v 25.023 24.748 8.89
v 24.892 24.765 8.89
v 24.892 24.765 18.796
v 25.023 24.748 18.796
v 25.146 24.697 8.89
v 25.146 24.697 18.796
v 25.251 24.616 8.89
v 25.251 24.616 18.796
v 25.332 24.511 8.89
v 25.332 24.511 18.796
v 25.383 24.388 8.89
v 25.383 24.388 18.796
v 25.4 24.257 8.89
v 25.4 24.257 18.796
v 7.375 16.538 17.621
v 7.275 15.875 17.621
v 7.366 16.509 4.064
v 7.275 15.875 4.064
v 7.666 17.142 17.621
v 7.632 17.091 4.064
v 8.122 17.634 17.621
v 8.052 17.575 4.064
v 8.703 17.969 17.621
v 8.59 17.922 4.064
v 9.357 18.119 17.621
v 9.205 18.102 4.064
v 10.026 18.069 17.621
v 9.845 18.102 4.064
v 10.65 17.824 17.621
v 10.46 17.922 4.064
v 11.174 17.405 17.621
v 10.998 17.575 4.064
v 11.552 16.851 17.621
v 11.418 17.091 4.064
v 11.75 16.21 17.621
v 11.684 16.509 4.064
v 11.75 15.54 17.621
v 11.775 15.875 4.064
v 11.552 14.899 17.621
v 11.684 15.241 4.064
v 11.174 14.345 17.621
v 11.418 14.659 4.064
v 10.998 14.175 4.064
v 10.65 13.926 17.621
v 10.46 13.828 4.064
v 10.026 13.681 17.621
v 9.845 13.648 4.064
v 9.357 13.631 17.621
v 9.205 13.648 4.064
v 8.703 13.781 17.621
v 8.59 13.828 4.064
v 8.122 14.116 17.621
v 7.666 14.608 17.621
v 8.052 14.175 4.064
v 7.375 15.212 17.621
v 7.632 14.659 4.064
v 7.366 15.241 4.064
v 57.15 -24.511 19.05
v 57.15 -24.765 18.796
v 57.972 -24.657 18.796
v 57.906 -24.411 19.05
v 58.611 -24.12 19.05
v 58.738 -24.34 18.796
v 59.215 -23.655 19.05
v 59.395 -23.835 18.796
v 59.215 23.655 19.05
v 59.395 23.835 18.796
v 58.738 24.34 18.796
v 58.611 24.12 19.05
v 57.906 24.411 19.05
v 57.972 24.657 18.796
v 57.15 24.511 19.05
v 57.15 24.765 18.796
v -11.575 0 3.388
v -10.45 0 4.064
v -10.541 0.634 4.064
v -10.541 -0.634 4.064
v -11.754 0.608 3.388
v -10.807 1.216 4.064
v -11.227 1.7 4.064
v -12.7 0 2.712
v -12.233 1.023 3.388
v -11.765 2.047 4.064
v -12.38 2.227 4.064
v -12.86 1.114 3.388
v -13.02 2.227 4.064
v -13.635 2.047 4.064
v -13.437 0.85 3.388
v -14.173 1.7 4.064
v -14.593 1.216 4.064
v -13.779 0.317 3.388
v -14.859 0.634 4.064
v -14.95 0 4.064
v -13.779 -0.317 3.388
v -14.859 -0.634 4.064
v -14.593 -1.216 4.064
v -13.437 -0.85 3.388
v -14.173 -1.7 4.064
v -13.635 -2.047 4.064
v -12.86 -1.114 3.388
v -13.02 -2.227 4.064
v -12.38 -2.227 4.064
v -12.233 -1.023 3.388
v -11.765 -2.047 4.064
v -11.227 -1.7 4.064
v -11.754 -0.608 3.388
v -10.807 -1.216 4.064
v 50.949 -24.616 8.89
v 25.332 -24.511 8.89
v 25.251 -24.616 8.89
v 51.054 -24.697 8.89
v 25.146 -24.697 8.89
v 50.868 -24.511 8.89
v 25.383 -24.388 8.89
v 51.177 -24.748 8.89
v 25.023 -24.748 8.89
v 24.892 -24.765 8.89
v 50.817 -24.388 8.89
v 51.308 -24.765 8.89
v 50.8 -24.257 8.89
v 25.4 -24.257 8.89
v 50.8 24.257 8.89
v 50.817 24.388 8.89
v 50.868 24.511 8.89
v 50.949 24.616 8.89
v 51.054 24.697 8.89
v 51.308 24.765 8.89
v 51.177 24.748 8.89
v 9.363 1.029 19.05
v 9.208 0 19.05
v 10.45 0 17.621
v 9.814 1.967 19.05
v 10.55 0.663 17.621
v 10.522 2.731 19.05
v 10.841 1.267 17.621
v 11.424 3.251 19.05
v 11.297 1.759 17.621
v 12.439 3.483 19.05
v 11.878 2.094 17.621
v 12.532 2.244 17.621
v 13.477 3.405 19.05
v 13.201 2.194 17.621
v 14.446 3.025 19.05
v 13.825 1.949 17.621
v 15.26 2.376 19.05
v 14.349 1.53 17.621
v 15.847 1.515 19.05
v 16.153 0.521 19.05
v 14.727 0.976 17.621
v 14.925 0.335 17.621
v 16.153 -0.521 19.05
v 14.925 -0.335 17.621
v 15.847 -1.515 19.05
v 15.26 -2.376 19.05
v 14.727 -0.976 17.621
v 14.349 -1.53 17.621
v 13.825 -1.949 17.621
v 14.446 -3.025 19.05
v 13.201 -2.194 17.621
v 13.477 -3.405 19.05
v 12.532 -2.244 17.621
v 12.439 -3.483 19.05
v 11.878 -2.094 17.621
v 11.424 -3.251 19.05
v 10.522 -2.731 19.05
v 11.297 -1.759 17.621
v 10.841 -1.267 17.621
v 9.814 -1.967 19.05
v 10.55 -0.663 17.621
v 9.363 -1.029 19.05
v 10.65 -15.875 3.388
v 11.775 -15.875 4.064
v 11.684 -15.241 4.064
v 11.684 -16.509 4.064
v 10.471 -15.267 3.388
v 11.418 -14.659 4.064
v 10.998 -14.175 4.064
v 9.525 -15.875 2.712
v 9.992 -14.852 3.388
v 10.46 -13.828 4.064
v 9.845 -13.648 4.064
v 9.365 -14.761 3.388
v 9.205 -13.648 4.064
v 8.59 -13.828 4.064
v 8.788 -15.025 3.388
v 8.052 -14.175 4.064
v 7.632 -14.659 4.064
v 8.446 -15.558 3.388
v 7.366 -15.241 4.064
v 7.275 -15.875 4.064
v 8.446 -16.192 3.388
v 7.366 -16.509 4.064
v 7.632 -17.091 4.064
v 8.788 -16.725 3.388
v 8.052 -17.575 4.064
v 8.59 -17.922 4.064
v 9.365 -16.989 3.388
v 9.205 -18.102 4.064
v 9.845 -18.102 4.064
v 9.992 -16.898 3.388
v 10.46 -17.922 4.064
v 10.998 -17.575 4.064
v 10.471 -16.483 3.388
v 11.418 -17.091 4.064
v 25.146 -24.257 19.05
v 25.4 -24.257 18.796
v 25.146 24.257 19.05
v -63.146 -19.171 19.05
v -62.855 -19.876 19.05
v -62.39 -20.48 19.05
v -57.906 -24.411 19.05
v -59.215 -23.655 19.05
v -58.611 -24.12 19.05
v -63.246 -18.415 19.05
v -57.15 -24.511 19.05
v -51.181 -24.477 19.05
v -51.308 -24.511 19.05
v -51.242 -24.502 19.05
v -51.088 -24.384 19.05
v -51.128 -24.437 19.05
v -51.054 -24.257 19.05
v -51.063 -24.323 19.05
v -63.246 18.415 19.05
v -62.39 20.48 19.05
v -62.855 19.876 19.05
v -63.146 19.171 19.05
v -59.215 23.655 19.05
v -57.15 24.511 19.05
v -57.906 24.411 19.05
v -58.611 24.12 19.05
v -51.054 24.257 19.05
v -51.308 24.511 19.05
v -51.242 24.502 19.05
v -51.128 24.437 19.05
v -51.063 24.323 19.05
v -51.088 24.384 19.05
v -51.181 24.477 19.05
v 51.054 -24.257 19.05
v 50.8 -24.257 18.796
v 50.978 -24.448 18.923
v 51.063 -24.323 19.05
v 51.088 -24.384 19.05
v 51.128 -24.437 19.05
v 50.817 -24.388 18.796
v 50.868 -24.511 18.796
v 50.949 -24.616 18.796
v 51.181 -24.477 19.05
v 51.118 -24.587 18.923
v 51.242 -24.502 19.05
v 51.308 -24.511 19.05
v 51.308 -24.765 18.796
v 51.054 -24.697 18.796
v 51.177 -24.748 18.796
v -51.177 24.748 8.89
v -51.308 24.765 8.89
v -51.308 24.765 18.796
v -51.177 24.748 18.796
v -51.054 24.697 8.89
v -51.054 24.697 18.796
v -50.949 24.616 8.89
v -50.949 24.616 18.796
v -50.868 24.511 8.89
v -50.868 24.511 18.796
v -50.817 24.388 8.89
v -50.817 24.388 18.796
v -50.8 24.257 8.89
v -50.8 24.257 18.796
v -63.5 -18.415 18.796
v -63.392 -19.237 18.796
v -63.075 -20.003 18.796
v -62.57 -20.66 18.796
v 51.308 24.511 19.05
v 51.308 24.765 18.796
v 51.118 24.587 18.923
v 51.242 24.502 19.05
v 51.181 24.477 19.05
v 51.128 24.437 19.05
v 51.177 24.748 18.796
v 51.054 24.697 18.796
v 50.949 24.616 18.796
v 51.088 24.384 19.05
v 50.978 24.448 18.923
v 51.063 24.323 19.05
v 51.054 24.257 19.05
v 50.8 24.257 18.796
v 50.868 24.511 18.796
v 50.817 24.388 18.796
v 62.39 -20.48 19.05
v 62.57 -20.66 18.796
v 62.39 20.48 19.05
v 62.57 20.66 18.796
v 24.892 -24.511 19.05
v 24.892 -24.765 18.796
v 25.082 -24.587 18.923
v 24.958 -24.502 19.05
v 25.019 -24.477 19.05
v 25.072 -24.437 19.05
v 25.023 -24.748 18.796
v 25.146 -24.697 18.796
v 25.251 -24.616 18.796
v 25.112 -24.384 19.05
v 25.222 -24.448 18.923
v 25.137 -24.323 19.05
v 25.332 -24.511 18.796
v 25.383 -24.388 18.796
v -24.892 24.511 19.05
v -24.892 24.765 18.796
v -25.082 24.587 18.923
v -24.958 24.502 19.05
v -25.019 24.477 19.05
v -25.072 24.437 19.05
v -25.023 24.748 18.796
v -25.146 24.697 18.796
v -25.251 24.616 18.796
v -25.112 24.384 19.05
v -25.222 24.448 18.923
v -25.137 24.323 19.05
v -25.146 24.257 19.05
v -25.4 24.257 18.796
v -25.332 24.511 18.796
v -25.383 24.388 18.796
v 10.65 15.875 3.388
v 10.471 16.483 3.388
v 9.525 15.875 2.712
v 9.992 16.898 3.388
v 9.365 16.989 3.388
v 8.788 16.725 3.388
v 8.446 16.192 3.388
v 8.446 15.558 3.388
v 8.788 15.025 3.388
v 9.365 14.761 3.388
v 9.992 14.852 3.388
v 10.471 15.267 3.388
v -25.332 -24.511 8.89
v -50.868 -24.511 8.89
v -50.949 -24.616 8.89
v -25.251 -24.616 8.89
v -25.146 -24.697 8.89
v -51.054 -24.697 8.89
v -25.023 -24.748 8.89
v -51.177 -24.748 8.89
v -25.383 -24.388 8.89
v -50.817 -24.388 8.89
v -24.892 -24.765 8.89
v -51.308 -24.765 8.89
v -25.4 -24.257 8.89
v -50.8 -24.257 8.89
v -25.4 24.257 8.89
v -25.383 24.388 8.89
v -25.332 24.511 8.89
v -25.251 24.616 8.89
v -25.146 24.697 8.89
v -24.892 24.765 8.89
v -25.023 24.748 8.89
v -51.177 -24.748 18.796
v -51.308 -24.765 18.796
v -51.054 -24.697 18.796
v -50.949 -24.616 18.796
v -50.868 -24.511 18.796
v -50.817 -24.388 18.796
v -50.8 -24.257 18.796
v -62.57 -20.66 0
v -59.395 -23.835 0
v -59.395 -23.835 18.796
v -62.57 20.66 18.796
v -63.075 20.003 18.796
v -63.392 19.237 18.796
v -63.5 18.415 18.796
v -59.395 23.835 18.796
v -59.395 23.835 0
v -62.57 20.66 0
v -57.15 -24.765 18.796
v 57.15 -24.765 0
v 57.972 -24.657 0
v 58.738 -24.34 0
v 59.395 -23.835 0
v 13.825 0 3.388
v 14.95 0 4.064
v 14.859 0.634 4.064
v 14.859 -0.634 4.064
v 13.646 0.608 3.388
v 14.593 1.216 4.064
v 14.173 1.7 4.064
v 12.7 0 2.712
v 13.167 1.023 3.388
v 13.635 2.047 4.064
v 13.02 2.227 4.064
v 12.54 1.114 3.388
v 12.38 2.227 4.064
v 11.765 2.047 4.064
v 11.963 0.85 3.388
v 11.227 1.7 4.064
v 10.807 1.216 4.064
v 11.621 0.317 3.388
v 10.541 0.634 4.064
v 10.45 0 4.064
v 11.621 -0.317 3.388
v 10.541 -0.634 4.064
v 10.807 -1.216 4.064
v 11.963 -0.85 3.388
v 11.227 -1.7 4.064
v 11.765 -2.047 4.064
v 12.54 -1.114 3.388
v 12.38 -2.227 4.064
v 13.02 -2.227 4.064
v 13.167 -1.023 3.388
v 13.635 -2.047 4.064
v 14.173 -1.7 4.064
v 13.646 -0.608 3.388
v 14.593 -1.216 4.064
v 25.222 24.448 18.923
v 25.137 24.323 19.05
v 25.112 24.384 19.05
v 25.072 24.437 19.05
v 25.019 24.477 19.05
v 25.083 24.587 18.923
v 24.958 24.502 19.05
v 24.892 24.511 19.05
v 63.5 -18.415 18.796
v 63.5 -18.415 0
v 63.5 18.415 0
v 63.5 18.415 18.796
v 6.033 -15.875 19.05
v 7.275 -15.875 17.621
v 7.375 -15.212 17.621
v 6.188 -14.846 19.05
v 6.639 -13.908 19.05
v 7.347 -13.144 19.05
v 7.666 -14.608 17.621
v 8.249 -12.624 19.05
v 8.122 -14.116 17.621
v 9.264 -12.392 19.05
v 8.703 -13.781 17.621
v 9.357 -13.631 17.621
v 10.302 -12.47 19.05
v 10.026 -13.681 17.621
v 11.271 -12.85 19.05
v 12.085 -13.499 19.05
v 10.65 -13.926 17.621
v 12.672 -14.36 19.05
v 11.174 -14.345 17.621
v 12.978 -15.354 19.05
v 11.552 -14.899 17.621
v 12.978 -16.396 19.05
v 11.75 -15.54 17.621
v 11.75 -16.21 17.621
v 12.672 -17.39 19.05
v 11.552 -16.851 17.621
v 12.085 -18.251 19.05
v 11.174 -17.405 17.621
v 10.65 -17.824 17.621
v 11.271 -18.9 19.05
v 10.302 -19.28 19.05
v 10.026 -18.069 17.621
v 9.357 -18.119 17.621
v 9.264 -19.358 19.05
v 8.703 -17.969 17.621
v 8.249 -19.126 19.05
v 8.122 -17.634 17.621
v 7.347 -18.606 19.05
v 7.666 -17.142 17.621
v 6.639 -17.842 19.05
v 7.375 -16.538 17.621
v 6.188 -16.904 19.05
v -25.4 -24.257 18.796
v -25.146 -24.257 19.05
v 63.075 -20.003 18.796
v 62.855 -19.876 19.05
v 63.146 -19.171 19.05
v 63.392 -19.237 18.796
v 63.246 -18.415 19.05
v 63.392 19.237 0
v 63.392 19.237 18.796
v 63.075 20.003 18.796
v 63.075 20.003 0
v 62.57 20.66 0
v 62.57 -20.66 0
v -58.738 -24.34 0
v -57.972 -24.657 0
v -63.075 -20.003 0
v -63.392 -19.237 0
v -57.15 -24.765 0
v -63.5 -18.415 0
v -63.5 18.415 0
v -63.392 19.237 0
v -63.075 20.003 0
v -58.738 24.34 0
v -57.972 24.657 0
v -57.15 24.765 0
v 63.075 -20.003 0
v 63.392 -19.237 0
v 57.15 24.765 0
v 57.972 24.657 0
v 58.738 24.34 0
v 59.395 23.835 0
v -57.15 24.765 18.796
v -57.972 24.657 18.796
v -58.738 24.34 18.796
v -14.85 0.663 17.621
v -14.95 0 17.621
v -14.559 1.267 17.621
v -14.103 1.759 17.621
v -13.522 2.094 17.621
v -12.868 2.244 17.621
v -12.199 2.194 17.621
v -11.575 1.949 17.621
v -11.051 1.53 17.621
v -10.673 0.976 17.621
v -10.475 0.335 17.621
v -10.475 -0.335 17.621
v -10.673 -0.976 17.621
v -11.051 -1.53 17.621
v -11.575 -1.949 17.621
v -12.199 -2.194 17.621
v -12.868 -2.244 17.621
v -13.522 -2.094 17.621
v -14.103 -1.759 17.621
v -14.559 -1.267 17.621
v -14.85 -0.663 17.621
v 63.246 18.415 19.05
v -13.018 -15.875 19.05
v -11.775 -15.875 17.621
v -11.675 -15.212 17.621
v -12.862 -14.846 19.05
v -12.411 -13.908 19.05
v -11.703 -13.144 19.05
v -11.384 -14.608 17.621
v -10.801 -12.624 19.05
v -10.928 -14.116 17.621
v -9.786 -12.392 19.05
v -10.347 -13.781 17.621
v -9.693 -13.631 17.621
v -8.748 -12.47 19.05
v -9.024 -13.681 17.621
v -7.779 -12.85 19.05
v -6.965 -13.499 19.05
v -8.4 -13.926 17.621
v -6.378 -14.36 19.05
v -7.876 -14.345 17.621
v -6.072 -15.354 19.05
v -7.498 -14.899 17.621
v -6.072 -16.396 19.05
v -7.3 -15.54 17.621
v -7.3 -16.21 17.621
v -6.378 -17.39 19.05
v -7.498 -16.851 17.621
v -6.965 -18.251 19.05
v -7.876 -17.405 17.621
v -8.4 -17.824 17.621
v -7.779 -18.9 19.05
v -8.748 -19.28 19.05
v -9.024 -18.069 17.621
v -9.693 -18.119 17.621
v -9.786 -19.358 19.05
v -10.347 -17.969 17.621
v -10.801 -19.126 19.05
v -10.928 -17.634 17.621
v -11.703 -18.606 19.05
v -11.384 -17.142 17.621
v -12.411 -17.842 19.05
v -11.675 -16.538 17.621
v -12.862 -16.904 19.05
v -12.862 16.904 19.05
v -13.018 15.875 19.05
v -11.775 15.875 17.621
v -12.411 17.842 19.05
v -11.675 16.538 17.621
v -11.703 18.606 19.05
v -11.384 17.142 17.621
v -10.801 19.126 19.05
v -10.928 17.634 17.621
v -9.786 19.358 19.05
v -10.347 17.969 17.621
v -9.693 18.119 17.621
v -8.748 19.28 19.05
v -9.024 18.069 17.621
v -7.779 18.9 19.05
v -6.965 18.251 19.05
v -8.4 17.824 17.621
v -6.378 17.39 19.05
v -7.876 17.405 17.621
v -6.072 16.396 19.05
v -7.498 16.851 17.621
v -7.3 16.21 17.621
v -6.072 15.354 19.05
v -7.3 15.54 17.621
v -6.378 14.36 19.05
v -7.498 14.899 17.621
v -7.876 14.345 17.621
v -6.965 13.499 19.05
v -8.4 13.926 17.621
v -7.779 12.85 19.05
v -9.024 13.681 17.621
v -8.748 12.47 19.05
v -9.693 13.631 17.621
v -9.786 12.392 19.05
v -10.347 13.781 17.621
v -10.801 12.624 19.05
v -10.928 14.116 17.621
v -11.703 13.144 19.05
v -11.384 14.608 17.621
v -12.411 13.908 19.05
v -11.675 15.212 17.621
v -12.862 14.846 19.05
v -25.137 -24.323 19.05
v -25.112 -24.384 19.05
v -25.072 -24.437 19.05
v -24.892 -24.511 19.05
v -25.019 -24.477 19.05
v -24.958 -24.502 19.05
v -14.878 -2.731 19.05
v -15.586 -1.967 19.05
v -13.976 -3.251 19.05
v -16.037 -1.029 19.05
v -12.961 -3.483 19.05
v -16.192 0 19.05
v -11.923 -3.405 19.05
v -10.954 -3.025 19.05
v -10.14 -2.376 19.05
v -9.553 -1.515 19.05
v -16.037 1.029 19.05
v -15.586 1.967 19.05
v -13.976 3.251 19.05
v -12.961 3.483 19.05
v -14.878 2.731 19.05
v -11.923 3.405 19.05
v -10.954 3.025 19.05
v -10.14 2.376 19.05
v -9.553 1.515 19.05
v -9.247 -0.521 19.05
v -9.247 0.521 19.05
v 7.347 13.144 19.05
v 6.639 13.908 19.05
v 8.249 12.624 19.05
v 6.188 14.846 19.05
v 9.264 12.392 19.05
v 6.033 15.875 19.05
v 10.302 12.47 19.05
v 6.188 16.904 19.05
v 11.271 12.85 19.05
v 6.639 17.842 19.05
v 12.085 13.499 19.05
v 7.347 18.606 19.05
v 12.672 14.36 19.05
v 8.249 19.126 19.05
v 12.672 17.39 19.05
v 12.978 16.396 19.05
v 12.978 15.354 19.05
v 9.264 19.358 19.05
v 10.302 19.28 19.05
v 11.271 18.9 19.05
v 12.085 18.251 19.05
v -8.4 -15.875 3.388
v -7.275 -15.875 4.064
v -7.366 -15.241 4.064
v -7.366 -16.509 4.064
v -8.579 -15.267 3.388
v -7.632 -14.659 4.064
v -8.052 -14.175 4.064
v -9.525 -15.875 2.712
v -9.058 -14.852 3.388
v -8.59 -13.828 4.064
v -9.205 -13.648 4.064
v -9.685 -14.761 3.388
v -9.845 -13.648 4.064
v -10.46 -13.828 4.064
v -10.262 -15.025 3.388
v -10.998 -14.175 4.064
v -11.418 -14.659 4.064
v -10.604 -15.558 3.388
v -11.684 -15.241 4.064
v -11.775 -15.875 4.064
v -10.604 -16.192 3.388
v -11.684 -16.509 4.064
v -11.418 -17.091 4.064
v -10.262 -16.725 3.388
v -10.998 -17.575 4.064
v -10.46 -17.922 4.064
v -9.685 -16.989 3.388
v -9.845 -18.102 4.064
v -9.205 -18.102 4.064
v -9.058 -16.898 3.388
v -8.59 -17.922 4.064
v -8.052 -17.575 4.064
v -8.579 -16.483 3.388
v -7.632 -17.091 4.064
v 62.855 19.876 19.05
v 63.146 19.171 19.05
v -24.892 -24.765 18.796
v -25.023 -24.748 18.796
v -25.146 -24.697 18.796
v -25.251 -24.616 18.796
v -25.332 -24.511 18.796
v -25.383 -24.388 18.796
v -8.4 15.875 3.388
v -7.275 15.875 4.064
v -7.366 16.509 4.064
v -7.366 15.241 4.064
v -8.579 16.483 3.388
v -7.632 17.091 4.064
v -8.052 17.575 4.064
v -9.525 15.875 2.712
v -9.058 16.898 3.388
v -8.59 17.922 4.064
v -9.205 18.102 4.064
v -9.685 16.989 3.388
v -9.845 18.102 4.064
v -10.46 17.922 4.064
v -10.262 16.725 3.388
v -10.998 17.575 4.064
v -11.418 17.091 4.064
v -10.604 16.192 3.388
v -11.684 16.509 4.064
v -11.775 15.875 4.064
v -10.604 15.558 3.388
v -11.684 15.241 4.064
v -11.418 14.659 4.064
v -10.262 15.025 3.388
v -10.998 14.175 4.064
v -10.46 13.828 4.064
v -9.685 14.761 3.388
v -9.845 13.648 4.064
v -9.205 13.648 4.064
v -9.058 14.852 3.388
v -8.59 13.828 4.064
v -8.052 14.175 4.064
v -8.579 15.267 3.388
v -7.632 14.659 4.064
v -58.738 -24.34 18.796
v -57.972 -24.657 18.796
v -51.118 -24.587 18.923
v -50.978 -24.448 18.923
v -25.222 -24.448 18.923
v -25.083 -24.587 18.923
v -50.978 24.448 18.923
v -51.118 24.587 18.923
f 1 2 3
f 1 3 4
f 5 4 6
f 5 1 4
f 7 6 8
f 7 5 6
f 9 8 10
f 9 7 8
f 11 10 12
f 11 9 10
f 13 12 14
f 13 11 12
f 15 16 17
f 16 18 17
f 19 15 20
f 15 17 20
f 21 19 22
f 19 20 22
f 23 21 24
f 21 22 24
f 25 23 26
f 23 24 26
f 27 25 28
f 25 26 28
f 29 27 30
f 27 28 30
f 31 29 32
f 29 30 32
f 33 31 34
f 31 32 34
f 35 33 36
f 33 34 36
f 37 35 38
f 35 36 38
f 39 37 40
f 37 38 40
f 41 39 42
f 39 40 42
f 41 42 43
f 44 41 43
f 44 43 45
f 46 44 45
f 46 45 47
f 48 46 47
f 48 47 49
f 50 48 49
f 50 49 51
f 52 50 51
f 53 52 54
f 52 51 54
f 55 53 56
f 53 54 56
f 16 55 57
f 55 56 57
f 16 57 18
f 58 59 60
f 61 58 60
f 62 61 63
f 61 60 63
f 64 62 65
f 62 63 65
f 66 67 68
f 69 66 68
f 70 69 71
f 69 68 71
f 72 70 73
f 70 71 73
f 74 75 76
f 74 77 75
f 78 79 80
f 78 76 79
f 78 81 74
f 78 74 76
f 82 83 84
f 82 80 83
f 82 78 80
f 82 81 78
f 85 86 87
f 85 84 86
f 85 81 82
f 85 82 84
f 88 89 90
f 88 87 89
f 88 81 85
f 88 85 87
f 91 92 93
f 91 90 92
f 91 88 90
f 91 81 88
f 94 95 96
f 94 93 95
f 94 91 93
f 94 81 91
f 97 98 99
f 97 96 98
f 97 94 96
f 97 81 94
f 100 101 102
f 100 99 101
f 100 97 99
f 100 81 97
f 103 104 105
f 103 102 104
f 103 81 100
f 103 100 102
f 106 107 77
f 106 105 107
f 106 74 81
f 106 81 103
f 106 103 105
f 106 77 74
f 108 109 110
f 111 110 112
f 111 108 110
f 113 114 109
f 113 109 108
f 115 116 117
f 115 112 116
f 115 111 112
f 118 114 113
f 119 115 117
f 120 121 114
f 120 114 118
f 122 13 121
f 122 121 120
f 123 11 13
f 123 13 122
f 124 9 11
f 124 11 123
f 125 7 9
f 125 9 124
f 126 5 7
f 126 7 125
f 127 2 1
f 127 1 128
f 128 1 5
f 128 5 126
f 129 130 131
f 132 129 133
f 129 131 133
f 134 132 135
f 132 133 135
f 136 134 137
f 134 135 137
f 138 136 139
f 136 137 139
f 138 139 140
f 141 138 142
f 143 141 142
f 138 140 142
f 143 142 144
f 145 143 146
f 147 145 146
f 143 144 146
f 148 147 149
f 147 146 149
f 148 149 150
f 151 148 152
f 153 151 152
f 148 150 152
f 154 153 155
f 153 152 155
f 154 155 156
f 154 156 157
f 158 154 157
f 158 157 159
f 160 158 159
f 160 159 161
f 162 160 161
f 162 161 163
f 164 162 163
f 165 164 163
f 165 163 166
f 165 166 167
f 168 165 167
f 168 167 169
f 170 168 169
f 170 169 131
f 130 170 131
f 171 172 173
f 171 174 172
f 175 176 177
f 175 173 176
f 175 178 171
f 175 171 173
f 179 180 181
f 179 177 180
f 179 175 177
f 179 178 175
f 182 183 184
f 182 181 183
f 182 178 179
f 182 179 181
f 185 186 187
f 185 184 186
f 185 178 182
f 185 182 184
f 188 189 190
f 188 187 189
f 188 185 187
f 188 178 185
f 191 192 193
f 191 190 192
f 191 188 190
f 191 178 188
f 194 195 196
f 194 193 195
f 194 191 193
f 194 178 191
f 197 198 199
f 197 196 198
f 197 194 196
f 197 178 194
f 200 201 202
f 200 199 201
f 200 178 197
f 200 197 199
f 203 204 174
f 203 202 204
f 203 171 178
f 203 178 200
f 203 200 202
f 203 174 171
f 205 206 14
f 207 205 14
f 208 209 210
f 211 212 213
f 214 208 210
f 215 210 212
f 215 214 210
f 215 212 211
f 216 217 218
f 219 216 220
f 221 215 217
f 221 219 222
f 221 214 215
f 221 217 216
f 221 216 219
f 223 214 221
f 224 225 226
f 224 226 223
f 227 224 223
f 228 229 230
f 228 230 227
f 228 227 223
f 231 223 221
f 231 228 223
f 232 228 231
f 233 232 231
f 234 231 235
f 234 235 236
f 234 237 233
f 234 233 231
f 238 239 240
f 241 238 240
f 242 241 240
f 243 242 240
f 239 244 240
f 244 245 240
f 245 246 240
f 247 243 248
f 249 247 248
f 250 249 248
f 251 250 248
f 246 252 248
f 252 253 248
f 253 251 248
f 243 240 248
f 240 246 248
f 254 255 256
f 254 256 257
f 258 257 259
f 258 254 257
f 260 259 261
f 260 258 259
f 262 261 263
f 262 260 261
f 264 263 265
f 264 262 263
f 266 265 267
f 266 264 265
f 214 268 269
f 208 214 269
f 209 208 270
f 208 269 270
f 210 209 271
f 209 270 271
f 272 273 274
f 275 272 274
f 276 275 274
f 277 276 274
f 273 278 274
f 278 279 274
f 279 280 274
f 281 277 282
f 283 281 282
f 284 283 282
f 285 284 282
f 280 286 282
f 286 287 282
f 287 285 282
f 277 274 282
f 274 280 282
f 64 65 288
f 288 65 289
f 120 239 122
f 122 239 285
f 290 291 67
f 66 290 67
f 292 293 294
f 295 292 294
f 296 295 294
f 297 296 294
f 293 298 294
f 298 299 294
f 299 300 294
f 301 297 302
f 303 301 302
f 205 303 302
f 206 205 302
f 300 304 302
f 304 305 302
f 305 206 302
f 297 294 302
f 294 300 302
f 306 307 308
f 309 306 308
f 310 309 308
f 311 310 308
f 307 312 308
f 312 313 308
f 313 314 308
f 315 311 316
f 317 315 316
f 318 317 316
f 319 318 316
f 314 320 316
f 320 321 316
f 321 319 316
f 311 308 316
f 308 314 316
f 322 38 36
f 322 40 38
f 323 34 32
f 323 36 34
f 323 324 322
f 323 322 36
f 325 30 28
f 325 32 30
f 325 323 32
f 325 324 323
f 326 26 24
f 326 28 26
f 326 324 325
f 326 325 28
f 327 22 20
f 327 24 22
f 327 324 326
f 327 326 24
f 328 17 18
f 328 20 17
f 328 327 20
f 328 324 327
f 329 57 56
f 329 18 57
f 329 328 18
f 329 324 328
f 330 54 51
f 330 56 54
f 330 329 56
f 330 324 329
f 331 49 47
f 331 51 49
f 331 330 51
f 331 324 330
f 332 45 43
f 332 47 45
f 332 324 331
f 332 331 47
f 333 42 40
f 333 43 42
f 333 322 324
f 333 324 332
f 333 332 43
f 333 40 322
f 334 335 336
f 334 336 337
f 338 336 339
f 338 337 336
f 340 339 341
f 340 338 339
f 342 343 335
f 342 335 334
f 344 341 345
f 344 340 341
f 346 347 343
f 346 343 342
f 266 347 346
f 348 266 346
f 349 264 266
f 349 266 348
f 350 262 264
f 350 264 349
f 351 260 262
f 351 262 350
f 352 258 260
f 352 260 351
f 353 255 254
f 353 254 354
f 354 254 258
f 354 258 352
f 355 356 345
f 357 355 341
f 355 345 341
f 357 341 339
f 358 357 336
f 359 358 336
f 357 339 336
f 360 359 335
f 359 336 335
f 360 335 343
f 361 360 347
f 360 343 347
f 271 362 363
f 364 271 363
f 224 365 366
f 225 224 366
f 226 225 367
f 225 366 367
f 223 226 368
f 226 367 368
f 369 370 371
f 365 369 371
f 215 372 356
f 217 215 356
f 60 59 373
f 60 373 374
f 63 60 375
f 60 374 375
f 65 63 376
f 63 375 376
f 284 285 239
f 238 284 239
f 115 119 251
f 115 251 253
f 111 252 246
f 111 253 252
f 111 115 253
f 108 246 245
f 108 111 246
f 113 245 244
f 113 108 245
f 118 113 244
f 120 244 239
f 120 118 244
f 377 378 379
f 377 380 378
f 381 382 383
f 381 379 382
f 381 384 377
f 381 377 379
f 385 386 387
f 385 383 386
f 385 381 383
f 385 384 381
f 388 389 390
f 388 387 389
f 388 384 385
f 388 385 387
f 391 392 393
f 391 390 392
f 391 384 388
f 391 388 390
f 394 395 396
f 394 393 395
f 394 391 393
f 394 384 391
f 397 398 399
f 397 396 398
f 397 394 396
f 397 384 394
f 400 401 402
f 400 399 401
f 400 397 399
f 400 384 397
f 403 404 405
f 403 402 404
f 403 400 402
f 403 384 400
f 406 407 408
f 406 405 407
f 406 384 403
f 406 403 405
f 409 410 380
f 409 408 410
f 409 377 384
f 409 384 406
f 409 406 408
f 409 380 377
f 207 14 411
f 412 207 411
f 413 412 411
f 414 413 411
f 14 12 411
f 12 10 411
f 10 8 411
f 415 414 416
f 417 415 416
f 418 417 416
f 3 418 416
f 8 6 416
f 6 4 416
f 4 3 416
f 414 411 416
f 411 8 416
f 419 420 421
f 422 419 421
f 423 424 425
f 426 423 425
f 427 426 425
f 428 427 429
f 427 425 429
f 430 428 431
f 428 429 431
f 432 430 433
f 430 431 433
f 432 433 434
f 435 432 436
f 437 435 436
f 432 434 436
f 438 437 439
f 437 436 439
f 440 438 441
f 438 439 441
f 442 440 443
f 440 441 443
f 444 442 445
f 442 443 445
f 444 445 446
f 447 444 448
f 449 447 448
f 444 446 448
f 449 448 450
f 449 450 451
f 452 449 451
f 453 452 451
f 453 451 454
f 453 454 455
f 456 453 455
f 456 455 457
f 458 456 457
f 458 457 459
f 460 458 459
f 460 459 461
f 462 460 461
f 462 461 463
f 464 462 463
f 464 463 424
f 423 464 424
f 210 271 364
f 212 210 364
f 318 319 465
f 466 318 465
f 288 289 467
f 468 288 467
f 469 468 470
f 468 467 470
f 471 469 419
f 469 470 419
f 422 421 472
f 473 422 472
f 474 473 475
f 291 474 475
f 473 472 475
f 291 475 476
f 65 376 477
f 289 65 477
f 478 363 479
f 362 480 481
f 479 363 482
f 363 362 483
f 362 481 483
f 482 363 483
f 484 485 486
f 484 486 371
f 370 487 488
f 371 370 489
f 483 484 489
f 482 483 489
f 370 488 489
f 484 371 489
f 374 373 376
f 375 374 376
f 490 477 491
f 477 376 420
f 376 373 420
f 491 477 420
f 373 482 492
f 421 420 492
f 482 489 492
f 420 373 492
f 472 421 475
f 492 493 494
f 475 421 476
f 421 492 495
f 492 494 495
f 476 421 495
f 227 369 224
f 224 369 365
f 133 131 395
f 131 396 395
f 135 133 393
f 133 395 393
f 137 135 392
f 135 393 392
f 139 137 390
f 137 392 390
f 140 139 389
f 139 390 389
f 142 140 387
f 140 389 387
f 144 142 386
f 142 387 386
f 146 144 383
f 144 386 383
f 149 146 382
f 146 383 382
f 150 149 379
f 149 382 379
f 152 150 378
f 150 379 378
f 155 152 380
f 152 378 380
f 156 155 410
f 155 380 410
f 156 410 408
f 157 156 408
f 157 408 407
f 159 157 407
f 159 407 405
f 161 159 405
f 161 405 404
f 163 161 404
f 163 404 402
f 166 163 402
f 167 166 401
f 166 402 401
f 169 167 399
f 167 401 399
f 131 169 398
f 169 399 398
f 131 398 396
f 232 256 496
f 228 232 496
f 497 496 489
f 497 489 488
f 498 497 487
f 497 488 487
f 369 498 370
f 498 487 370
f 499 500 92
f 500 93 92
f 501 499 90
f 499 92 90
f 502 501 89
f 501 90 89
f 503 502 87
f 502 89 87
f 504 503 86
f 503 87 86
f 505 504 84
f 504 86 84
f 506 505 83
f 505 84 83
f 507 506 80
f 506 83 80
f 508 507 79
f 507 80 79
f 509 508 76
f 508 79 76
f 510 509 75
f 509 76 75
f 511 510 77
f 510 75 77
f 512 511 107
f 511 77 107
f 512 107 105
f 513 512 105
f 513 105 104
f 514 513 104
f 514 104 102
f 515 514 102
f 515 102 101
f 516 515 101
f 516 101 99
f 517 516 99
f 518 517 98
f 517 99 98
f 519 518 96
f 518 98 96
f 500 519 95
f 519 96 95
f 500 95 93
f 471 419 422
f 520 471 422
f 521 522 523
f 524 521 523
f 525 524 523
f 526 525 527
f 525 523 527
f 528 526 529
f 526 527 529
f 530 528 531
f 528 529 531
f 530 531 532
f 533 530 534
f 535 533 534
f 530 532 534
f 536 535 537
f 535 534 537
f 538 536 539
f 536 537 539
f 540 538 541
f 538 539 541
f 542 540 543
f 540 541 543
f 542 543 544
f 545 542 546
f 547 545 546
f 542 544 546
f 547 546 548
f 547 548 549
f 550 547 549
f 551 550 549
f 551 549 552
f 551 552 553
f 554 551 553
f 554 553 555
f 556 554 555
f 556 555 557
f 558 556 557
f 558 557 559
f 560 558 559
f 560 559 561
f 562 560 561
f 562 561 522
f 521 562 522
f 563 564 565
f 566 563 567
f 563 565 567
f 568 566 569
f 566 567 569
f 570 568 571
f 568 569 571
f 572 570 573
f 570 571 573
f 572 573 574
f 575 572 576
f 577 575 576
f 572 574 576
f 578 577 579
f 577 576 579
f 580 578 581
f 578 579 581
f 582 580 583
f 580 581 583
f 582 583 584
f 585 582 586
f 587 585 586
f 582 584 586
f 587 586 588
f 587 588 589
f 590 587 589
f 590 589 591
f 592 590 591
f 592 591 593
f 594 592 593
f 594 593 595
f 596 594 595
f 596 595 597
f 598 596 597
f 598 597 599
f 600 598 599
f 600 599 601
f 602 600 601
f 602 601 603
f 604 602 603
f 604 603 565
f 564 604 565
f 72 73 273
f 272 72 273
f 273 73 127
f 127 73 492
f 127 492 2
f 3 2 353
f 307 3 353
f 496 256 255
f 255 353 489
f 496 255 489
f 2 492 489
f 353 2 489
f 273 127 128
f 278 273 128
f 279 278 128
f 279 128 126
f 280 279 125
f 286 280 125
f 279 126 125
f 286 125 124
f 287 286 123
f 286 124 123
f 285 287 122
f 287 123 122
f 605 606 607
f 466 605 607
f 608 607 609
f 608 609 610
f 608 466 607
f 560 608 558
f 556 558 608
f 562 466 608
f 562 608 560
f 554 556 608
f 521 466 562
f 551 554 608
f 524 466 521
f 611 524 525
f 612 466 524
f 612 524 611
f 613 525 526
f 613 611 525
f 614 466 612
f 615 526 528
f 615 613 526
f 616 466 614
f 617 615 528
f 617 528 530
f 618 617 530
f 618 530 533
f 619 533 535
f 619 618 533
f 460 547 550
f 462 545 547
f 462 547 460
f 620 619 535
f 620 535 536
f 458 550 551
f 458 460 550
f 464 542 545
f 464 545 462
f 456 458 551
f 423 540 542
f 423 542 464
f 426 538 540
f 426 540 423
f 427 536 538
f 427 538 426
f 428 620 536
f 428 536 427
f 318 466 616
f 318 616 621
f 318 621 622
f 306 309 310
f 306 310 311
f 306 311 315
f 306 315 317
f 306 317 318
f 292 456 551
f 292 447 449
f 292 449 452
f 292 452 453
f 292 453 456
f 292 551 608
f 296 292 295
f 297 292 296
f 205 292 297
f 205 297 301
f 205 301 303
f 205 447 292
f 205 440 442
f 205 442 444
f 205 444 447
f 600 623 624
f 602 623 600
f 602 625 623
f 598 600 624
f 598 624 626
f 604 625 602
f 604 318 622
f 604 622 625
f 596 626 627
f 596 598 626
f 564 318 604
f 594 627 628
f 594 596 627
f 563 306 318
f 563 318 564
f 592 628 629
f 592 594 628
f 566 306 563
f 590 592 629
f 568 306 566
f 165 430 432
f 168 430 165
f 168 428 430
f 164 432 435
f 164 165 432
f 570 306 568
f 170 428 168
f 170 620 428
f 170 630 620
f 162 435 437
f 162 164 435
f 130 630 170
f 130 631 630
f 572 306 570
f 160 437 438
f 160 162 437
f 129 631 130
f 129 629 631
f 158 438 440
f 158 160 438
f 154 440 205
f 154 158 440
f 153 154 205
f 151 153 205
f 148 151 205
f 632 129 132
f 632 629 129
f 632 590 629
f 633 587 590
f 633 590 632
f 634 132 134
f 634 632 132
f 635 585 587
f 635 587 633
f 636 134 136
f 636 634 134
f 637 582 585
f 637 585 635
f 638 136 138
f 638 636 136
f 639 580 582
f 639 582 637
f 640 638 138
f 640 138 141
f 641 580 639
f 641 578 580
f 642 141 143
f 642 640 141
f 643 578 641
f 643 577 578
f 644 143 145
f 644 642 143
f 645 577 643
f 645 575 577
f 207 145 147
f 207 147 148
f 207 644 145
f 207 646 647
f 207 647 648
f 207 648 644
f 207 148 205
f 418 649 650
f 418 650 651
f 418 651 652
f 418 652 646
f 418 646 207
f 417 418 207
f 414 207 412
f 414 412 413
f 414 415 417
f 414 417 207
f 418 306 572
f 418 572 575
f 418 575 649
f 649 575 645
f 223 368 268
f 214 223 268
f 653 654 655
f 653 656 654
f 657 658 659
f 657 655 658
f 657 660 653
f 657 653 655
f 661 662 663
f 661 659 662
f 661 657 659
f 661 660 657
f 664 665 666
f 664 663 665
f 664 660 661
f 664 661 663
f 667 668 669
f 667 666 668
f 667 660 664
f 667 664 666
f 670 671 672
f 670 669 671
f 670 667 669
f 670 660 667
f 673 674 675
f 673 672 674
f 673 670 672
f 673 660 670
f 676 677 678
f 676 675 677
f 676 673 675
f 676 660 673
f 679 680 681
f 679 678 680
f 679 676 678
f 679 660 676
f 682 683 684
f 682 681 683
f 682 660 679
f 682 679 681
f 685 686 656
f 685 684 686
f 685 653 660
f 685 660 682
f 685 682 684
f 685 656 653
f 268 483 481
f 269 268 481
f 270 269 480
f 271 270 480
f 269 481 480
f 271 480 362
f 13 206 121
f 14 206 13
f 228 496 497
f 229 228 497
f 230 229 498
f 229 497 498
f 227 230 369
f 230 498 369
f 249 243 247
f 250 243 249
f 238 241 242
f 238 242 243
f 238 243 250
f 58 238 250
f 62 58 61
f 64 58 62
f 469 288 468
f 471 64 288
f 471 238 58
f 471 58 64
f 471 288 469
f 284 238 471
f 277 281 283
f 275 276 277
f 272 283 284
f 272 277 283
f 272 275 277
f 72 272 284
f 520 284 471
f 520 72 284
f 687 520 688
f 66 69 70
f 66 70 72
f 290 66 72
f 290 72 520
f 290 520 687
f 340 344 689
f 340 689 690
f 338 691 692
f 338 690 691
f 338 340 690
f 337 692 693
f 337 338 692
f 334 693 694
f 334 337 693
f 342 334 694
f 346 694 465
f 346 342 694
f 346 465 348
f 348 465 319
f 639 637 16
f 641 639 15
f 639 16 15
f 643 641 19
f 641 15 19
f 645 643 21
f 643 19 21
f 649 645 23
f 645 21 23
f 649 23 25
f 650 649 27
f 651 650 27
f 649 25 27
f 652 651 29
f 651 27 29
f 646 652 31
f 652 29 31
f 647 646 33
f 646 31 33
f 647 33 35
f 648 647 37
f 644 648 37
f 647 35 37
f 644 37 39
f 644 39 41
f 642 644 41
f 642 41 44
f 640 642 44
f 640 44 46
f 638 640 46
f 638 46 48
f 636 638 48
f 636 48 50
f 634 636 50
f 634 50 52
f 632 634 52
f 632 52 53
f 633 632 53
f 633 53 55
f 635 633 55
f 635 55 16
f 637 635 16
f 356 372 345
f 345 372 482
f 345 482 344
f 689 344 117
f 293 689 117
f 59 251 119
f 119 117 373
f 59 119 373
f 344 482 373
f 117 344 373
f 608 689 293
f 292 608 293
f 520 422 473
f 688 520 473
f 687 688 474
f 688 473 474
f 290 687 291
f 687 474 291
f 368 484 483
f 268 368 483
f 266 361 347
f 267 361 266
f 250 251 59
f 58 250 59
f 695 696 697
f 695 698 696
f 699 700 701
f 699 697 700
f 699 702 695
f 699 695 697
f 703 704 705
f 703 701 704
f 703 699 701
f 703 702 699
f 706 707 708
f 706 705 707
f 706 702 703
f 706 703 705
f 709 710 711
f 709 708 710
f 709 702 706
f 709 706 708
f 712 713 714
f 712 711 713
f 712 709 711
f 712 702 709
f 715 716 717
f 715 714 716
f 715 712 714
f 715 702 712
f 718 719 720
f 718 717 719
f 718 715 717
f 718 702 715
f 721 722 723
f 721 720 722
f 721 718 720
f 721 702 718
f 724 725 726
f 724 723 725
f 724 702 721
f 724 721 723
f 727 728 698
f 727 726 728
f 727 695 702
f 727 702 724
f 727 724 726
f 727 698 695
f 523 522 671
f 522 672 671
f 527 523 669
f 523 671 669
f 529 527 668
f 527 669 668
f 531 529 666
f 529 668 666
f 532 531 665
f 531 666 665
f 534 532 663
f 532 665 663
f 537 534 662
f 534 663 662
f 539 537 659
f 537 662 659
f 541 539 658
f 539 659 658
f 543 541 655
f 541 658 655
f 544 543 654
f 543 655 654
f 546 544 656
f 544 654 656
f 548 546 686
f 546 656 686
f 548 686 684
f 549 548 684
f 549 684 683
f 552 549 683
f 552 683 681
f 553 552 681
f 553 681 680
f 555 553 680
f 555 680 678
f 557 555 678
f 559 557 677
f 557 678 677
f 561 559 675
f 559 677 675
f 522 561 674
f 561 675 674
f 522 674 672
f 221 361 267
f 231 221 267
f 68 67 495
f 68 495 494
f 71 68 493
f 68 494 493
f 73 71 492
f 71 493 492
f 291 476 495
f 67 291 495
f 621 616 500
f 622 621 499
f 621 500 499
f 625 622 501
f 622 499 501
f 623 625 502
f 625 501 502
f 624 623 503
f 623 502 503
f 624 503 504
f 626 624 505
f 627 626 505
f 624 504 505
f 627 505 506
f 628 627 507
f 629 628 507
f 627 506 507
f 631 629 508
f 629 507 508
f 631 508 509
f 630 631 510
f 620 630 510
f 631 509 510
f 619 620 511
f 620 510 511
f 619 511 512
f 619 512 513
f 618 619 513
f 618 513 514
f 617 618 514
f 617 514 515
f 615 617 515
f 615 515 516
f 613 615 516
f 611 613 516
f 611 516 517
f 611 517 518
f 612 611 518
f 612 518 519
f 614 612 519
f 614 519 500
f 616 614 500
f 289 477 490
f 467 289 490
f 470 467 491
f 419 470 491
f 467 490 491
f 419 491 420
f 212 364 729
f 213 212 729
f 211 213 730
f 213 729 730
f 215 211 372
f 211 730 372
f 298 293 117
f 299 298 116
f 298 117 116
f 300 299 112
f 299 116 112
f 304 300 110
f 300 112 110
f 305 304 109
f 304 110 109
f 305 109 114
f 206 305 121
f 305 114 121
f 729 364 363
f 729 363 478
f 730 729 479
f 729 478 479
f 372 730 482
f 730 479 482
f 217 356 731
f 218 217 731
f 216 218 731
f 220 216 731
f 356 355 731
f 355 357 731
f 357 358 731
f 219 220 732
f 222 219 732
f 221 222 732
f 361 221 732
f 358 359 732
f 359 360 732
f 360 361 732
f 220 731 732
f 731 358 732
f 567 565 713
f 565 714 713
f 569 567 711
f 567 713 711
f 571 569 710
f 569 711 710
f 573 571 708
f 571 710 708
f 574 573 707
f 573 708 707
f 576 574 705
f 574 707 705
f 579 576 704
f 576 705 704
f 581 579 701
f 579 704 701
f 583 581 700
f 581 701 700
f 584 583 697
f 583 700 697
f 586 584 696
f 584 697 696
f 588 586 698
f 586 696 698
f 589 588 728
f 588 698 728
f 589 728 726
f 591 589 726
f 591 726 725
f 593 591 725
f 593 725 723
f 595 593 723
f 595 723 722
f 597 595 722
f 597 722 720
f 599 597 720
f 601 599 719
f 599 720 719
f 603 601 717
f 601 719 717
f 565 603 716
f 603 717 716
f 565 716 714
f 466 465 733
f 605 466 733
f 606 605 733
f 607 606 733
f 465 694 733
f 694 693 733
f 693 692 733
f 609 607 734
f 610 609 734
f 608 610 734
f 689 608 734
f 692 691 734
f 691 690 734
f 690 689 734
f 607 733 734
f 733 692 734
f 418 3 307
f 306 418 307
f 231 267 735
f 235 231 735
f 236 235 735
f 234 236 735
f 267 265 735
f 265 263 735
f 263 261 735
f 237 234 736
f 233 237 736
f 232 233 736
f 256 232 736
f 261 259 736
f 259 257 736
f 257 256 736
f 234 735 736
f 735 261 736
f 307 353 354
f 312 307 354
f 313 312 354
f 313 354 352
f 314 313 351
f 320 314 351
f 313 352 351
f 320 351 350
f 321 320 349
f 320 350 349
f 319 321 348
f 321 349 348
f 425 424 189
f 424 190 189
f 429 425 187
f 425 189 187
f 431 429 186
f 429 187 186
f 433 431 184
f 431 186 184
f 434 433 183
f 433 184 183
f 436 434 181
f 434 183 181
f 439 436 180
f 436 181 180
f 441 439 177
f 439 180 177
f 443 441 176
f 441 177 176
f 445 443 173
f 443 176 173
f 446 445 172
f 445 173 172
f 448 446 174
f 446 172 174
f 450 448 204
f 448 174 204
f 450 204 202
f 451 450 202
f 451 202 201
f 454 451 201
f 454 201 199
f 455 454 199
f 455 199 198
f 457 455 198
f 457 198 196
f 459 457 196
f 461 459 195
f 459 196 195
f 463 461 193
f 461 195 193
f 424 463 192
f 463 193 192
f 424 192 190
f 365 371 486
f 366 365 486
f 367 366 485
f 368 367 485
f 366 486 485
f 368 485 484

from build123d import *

# Parameters (mm, degrees)
PAD_DEPTH        = 19.05
HOLE_D           = 4.5
HOLE_DEPTH       = 14.986
HOLE_CSINK_D     = 6.985
HOLE_CSINK_ANGLE = 82
HOLE_TIPS_R      = 2.25
SKETCH002_W      = 25.4
SKETCH002_H      = 49.53
POCKET_DEPTH     = 10.16
FILLET_R         = 0.508
CHAMFER_SIZE     = 0.254


with BuildPart() as part:
    # Sketch → Pad (new body)
    with BuildSketch(Plane.XY):
        with BuildLine():
            Line((-62.570064, -20.660064), (-59.395064, -23.835064))
            ThreePointArc((-59.395064, -23.835064), (-58.36502, -24.523318), (-57.15, -24.765))
            Line((-57.15, -24.765), (57.15, -24.765))
            ThreePointArc((57.15, -24.765), (58.36502, -24.523318), (59.395064, -23.835064))
            Line((59.395064, -23.835064), (62.570064, -20.660064))
            ThreePointArc((62.570064, -20.660064), (63.258318, -19.63002), (63.5, -18.415))
            Line((63.5, -18.415), (63.5, 18.415))
            ThreePointArc((63.5, 18.415), (63.258318, 19.63002), (62.570064, 20.660064))
            Line((62.570064, 20.660064), (59.395064, 23.835064))
            ThreePointArc((59.395064, 23.835064), (58.36502, 24.523318), (57.15, 24.765))
            Line((57.15, 24.765), (-57.15, 24.765))
            ThreePointArc((-57.15, 24.765), (-58.36502, 24.523318), (-59.395064, 23.835064))
            Line((-59.395064, 23.835064), (-62.570064, 20.660064))
            ThreePointArc((-62.570064, 20.660064), (-63.258318, 19.63002), (-63.5, 18.415))
            Line((-63.5, 18.415), (-63.5, -18.415))
            ThreePointArc((-63.5, -18.415), (-63.258318, -19.63002), (-62.570064, -20.660064))
        make_face()
    extrude(amount=PAD_DEPTH)

    # Hole
    with Locations(Plane.XY.offset(19.05)):
        with Locations((-9.525, 15.875), (9.525, 15.875), (12.7, 0), (-12.7, 0), (-9.525, -15.875), (9.525, -15.875)):
            CounterSinkHole(HOLE_D / 2, HOLE_CSINK_D / 2, depth=HOLE_DEPTH, counter_sink_angle=HOLE_CSINK_ANGLE)

    # Hole tips → Hole tip 1 section 0
    with BuildSketch(Plane.XY.offset(4.064), mode=Mode.PRIVATE) as hole_tip_1_s0:
        with Locations((-9.525, 15.875)):
            Circle(HOLE_TIPS_R)
    loft([hole_tip_1_s0.sketch, Vertex(-9.525, 15.875, 2.712064)], mode=Mode.SUBTRACT)

    # Hole tips → Hole tip 2 section 0
    with BuildSketch(Plane.XY.offset(4.064), mode=Mode.PRIVATE) as hole_tip_2_s0:
        with Locations((9.525, 15.875)):
            Circle(HOLE_TIPS_R)
    loft([hole_tip_2_s0.sketch, Vertex(9.525, 15.875, 2.712064)], mode=Mode.SUBTRACT)

    # Hole tips → Hole tip 3 section 0
    with BuildSketch(Plane.XY.offset(4.064), mode=Mode.PRIVATE) as hole_tip_3_s0:
        with Locations((12.7, 0)):
            Circle(HOLE_TIPS_R)
    loft([hole_tip_3_s0.sketch, Vertex(12.7, 0, 2.712064)], mode=Mode.SUBTRACT)

    # Hole tips → Hole tip 4 section 0
    with BuildSketch(Plane.XY.offset(4.064), mode=Mode.PRIVATE) as hole_tip_4_s0:
        with Locations((-12.7, 0)):
            Circle(HOLE_TIPS_R)
    loft([hole_tip_4_s0.sketch, Vertex(-12.7, 0, 2.712064)], mode=Mode.SUBTRACT)

    # Hole tips → Hole tip 5 section 0
    with BuildSketch(Plane.XY.offset(4.064), mode=Mode.PRIVATE) as hole_tip_5_s0:
        with Locations((-9.525, -15.875)):
            Circle(HOLE_TIPS_R)
    loft([hole_tip_5_s0.sketch, Vertex(-9.525, -15.875, 2.712064)], mode=Mode.SUBTRACT)

    # Hole tips → Hole tip 6 section 0
    with BuildSketch(Plane.XY.offset(4.064), mode=Mode.PRIVATE) as hole_tip_6_s0:
        with Locations((9.525, -15.875)):
            Circle(HOLE_TIPS_R)
    loft([hole_tip_6_s0.sketch, Vertex(9.525, -15.875, 2.712064)], mode=Mode.SUBTRACT)

    # Sketch002 (on Face5 of Hole) → Pocket (cut)
    with BuildSketch(Plane.XY.offset(19.05)):
        with Locations((-38.1, 0)):
            Rectangle(SKETCH002_W, SKETCH002_H)
        with Locations((38.1, 0)):
            Rectangle(SKETCH002_W, SKETCH002_H)
    extrude(amount=-POCKET_DEPTH, mode=Mode.SUBTRACT)

    # Fillet
    fillet_edges = [part.edges().sort_by_distance(p)[0] for p in [
        (-50.8, -24.765, 13.97),
        (-50.8, 24.765, 13.97),
        (-25.4, -24.765, 13.97),
        (25.4, -24.765, 13.97),
        (50.8, -24.765, 13.97),
        (50.8, 24.765, 13.97),
        (25.4, 24.765, 13.97),
        (-25.4, 24.765, 13.97),
    ]]
    fillet(fillet_edges, radius=FILLET_R)

    # Chamfer
    chamfer_edges = [part.edges().sort_by_distance(p)[0] for p in [
        (54.229, 24.765, 19.05),
        (0, 24.765, 19.05),
        (-54.229, 24.765, 19.05),
    ]]
    chamfer(chamfer_edges, length=CHAMFER_SIZE)


solid = part.part
